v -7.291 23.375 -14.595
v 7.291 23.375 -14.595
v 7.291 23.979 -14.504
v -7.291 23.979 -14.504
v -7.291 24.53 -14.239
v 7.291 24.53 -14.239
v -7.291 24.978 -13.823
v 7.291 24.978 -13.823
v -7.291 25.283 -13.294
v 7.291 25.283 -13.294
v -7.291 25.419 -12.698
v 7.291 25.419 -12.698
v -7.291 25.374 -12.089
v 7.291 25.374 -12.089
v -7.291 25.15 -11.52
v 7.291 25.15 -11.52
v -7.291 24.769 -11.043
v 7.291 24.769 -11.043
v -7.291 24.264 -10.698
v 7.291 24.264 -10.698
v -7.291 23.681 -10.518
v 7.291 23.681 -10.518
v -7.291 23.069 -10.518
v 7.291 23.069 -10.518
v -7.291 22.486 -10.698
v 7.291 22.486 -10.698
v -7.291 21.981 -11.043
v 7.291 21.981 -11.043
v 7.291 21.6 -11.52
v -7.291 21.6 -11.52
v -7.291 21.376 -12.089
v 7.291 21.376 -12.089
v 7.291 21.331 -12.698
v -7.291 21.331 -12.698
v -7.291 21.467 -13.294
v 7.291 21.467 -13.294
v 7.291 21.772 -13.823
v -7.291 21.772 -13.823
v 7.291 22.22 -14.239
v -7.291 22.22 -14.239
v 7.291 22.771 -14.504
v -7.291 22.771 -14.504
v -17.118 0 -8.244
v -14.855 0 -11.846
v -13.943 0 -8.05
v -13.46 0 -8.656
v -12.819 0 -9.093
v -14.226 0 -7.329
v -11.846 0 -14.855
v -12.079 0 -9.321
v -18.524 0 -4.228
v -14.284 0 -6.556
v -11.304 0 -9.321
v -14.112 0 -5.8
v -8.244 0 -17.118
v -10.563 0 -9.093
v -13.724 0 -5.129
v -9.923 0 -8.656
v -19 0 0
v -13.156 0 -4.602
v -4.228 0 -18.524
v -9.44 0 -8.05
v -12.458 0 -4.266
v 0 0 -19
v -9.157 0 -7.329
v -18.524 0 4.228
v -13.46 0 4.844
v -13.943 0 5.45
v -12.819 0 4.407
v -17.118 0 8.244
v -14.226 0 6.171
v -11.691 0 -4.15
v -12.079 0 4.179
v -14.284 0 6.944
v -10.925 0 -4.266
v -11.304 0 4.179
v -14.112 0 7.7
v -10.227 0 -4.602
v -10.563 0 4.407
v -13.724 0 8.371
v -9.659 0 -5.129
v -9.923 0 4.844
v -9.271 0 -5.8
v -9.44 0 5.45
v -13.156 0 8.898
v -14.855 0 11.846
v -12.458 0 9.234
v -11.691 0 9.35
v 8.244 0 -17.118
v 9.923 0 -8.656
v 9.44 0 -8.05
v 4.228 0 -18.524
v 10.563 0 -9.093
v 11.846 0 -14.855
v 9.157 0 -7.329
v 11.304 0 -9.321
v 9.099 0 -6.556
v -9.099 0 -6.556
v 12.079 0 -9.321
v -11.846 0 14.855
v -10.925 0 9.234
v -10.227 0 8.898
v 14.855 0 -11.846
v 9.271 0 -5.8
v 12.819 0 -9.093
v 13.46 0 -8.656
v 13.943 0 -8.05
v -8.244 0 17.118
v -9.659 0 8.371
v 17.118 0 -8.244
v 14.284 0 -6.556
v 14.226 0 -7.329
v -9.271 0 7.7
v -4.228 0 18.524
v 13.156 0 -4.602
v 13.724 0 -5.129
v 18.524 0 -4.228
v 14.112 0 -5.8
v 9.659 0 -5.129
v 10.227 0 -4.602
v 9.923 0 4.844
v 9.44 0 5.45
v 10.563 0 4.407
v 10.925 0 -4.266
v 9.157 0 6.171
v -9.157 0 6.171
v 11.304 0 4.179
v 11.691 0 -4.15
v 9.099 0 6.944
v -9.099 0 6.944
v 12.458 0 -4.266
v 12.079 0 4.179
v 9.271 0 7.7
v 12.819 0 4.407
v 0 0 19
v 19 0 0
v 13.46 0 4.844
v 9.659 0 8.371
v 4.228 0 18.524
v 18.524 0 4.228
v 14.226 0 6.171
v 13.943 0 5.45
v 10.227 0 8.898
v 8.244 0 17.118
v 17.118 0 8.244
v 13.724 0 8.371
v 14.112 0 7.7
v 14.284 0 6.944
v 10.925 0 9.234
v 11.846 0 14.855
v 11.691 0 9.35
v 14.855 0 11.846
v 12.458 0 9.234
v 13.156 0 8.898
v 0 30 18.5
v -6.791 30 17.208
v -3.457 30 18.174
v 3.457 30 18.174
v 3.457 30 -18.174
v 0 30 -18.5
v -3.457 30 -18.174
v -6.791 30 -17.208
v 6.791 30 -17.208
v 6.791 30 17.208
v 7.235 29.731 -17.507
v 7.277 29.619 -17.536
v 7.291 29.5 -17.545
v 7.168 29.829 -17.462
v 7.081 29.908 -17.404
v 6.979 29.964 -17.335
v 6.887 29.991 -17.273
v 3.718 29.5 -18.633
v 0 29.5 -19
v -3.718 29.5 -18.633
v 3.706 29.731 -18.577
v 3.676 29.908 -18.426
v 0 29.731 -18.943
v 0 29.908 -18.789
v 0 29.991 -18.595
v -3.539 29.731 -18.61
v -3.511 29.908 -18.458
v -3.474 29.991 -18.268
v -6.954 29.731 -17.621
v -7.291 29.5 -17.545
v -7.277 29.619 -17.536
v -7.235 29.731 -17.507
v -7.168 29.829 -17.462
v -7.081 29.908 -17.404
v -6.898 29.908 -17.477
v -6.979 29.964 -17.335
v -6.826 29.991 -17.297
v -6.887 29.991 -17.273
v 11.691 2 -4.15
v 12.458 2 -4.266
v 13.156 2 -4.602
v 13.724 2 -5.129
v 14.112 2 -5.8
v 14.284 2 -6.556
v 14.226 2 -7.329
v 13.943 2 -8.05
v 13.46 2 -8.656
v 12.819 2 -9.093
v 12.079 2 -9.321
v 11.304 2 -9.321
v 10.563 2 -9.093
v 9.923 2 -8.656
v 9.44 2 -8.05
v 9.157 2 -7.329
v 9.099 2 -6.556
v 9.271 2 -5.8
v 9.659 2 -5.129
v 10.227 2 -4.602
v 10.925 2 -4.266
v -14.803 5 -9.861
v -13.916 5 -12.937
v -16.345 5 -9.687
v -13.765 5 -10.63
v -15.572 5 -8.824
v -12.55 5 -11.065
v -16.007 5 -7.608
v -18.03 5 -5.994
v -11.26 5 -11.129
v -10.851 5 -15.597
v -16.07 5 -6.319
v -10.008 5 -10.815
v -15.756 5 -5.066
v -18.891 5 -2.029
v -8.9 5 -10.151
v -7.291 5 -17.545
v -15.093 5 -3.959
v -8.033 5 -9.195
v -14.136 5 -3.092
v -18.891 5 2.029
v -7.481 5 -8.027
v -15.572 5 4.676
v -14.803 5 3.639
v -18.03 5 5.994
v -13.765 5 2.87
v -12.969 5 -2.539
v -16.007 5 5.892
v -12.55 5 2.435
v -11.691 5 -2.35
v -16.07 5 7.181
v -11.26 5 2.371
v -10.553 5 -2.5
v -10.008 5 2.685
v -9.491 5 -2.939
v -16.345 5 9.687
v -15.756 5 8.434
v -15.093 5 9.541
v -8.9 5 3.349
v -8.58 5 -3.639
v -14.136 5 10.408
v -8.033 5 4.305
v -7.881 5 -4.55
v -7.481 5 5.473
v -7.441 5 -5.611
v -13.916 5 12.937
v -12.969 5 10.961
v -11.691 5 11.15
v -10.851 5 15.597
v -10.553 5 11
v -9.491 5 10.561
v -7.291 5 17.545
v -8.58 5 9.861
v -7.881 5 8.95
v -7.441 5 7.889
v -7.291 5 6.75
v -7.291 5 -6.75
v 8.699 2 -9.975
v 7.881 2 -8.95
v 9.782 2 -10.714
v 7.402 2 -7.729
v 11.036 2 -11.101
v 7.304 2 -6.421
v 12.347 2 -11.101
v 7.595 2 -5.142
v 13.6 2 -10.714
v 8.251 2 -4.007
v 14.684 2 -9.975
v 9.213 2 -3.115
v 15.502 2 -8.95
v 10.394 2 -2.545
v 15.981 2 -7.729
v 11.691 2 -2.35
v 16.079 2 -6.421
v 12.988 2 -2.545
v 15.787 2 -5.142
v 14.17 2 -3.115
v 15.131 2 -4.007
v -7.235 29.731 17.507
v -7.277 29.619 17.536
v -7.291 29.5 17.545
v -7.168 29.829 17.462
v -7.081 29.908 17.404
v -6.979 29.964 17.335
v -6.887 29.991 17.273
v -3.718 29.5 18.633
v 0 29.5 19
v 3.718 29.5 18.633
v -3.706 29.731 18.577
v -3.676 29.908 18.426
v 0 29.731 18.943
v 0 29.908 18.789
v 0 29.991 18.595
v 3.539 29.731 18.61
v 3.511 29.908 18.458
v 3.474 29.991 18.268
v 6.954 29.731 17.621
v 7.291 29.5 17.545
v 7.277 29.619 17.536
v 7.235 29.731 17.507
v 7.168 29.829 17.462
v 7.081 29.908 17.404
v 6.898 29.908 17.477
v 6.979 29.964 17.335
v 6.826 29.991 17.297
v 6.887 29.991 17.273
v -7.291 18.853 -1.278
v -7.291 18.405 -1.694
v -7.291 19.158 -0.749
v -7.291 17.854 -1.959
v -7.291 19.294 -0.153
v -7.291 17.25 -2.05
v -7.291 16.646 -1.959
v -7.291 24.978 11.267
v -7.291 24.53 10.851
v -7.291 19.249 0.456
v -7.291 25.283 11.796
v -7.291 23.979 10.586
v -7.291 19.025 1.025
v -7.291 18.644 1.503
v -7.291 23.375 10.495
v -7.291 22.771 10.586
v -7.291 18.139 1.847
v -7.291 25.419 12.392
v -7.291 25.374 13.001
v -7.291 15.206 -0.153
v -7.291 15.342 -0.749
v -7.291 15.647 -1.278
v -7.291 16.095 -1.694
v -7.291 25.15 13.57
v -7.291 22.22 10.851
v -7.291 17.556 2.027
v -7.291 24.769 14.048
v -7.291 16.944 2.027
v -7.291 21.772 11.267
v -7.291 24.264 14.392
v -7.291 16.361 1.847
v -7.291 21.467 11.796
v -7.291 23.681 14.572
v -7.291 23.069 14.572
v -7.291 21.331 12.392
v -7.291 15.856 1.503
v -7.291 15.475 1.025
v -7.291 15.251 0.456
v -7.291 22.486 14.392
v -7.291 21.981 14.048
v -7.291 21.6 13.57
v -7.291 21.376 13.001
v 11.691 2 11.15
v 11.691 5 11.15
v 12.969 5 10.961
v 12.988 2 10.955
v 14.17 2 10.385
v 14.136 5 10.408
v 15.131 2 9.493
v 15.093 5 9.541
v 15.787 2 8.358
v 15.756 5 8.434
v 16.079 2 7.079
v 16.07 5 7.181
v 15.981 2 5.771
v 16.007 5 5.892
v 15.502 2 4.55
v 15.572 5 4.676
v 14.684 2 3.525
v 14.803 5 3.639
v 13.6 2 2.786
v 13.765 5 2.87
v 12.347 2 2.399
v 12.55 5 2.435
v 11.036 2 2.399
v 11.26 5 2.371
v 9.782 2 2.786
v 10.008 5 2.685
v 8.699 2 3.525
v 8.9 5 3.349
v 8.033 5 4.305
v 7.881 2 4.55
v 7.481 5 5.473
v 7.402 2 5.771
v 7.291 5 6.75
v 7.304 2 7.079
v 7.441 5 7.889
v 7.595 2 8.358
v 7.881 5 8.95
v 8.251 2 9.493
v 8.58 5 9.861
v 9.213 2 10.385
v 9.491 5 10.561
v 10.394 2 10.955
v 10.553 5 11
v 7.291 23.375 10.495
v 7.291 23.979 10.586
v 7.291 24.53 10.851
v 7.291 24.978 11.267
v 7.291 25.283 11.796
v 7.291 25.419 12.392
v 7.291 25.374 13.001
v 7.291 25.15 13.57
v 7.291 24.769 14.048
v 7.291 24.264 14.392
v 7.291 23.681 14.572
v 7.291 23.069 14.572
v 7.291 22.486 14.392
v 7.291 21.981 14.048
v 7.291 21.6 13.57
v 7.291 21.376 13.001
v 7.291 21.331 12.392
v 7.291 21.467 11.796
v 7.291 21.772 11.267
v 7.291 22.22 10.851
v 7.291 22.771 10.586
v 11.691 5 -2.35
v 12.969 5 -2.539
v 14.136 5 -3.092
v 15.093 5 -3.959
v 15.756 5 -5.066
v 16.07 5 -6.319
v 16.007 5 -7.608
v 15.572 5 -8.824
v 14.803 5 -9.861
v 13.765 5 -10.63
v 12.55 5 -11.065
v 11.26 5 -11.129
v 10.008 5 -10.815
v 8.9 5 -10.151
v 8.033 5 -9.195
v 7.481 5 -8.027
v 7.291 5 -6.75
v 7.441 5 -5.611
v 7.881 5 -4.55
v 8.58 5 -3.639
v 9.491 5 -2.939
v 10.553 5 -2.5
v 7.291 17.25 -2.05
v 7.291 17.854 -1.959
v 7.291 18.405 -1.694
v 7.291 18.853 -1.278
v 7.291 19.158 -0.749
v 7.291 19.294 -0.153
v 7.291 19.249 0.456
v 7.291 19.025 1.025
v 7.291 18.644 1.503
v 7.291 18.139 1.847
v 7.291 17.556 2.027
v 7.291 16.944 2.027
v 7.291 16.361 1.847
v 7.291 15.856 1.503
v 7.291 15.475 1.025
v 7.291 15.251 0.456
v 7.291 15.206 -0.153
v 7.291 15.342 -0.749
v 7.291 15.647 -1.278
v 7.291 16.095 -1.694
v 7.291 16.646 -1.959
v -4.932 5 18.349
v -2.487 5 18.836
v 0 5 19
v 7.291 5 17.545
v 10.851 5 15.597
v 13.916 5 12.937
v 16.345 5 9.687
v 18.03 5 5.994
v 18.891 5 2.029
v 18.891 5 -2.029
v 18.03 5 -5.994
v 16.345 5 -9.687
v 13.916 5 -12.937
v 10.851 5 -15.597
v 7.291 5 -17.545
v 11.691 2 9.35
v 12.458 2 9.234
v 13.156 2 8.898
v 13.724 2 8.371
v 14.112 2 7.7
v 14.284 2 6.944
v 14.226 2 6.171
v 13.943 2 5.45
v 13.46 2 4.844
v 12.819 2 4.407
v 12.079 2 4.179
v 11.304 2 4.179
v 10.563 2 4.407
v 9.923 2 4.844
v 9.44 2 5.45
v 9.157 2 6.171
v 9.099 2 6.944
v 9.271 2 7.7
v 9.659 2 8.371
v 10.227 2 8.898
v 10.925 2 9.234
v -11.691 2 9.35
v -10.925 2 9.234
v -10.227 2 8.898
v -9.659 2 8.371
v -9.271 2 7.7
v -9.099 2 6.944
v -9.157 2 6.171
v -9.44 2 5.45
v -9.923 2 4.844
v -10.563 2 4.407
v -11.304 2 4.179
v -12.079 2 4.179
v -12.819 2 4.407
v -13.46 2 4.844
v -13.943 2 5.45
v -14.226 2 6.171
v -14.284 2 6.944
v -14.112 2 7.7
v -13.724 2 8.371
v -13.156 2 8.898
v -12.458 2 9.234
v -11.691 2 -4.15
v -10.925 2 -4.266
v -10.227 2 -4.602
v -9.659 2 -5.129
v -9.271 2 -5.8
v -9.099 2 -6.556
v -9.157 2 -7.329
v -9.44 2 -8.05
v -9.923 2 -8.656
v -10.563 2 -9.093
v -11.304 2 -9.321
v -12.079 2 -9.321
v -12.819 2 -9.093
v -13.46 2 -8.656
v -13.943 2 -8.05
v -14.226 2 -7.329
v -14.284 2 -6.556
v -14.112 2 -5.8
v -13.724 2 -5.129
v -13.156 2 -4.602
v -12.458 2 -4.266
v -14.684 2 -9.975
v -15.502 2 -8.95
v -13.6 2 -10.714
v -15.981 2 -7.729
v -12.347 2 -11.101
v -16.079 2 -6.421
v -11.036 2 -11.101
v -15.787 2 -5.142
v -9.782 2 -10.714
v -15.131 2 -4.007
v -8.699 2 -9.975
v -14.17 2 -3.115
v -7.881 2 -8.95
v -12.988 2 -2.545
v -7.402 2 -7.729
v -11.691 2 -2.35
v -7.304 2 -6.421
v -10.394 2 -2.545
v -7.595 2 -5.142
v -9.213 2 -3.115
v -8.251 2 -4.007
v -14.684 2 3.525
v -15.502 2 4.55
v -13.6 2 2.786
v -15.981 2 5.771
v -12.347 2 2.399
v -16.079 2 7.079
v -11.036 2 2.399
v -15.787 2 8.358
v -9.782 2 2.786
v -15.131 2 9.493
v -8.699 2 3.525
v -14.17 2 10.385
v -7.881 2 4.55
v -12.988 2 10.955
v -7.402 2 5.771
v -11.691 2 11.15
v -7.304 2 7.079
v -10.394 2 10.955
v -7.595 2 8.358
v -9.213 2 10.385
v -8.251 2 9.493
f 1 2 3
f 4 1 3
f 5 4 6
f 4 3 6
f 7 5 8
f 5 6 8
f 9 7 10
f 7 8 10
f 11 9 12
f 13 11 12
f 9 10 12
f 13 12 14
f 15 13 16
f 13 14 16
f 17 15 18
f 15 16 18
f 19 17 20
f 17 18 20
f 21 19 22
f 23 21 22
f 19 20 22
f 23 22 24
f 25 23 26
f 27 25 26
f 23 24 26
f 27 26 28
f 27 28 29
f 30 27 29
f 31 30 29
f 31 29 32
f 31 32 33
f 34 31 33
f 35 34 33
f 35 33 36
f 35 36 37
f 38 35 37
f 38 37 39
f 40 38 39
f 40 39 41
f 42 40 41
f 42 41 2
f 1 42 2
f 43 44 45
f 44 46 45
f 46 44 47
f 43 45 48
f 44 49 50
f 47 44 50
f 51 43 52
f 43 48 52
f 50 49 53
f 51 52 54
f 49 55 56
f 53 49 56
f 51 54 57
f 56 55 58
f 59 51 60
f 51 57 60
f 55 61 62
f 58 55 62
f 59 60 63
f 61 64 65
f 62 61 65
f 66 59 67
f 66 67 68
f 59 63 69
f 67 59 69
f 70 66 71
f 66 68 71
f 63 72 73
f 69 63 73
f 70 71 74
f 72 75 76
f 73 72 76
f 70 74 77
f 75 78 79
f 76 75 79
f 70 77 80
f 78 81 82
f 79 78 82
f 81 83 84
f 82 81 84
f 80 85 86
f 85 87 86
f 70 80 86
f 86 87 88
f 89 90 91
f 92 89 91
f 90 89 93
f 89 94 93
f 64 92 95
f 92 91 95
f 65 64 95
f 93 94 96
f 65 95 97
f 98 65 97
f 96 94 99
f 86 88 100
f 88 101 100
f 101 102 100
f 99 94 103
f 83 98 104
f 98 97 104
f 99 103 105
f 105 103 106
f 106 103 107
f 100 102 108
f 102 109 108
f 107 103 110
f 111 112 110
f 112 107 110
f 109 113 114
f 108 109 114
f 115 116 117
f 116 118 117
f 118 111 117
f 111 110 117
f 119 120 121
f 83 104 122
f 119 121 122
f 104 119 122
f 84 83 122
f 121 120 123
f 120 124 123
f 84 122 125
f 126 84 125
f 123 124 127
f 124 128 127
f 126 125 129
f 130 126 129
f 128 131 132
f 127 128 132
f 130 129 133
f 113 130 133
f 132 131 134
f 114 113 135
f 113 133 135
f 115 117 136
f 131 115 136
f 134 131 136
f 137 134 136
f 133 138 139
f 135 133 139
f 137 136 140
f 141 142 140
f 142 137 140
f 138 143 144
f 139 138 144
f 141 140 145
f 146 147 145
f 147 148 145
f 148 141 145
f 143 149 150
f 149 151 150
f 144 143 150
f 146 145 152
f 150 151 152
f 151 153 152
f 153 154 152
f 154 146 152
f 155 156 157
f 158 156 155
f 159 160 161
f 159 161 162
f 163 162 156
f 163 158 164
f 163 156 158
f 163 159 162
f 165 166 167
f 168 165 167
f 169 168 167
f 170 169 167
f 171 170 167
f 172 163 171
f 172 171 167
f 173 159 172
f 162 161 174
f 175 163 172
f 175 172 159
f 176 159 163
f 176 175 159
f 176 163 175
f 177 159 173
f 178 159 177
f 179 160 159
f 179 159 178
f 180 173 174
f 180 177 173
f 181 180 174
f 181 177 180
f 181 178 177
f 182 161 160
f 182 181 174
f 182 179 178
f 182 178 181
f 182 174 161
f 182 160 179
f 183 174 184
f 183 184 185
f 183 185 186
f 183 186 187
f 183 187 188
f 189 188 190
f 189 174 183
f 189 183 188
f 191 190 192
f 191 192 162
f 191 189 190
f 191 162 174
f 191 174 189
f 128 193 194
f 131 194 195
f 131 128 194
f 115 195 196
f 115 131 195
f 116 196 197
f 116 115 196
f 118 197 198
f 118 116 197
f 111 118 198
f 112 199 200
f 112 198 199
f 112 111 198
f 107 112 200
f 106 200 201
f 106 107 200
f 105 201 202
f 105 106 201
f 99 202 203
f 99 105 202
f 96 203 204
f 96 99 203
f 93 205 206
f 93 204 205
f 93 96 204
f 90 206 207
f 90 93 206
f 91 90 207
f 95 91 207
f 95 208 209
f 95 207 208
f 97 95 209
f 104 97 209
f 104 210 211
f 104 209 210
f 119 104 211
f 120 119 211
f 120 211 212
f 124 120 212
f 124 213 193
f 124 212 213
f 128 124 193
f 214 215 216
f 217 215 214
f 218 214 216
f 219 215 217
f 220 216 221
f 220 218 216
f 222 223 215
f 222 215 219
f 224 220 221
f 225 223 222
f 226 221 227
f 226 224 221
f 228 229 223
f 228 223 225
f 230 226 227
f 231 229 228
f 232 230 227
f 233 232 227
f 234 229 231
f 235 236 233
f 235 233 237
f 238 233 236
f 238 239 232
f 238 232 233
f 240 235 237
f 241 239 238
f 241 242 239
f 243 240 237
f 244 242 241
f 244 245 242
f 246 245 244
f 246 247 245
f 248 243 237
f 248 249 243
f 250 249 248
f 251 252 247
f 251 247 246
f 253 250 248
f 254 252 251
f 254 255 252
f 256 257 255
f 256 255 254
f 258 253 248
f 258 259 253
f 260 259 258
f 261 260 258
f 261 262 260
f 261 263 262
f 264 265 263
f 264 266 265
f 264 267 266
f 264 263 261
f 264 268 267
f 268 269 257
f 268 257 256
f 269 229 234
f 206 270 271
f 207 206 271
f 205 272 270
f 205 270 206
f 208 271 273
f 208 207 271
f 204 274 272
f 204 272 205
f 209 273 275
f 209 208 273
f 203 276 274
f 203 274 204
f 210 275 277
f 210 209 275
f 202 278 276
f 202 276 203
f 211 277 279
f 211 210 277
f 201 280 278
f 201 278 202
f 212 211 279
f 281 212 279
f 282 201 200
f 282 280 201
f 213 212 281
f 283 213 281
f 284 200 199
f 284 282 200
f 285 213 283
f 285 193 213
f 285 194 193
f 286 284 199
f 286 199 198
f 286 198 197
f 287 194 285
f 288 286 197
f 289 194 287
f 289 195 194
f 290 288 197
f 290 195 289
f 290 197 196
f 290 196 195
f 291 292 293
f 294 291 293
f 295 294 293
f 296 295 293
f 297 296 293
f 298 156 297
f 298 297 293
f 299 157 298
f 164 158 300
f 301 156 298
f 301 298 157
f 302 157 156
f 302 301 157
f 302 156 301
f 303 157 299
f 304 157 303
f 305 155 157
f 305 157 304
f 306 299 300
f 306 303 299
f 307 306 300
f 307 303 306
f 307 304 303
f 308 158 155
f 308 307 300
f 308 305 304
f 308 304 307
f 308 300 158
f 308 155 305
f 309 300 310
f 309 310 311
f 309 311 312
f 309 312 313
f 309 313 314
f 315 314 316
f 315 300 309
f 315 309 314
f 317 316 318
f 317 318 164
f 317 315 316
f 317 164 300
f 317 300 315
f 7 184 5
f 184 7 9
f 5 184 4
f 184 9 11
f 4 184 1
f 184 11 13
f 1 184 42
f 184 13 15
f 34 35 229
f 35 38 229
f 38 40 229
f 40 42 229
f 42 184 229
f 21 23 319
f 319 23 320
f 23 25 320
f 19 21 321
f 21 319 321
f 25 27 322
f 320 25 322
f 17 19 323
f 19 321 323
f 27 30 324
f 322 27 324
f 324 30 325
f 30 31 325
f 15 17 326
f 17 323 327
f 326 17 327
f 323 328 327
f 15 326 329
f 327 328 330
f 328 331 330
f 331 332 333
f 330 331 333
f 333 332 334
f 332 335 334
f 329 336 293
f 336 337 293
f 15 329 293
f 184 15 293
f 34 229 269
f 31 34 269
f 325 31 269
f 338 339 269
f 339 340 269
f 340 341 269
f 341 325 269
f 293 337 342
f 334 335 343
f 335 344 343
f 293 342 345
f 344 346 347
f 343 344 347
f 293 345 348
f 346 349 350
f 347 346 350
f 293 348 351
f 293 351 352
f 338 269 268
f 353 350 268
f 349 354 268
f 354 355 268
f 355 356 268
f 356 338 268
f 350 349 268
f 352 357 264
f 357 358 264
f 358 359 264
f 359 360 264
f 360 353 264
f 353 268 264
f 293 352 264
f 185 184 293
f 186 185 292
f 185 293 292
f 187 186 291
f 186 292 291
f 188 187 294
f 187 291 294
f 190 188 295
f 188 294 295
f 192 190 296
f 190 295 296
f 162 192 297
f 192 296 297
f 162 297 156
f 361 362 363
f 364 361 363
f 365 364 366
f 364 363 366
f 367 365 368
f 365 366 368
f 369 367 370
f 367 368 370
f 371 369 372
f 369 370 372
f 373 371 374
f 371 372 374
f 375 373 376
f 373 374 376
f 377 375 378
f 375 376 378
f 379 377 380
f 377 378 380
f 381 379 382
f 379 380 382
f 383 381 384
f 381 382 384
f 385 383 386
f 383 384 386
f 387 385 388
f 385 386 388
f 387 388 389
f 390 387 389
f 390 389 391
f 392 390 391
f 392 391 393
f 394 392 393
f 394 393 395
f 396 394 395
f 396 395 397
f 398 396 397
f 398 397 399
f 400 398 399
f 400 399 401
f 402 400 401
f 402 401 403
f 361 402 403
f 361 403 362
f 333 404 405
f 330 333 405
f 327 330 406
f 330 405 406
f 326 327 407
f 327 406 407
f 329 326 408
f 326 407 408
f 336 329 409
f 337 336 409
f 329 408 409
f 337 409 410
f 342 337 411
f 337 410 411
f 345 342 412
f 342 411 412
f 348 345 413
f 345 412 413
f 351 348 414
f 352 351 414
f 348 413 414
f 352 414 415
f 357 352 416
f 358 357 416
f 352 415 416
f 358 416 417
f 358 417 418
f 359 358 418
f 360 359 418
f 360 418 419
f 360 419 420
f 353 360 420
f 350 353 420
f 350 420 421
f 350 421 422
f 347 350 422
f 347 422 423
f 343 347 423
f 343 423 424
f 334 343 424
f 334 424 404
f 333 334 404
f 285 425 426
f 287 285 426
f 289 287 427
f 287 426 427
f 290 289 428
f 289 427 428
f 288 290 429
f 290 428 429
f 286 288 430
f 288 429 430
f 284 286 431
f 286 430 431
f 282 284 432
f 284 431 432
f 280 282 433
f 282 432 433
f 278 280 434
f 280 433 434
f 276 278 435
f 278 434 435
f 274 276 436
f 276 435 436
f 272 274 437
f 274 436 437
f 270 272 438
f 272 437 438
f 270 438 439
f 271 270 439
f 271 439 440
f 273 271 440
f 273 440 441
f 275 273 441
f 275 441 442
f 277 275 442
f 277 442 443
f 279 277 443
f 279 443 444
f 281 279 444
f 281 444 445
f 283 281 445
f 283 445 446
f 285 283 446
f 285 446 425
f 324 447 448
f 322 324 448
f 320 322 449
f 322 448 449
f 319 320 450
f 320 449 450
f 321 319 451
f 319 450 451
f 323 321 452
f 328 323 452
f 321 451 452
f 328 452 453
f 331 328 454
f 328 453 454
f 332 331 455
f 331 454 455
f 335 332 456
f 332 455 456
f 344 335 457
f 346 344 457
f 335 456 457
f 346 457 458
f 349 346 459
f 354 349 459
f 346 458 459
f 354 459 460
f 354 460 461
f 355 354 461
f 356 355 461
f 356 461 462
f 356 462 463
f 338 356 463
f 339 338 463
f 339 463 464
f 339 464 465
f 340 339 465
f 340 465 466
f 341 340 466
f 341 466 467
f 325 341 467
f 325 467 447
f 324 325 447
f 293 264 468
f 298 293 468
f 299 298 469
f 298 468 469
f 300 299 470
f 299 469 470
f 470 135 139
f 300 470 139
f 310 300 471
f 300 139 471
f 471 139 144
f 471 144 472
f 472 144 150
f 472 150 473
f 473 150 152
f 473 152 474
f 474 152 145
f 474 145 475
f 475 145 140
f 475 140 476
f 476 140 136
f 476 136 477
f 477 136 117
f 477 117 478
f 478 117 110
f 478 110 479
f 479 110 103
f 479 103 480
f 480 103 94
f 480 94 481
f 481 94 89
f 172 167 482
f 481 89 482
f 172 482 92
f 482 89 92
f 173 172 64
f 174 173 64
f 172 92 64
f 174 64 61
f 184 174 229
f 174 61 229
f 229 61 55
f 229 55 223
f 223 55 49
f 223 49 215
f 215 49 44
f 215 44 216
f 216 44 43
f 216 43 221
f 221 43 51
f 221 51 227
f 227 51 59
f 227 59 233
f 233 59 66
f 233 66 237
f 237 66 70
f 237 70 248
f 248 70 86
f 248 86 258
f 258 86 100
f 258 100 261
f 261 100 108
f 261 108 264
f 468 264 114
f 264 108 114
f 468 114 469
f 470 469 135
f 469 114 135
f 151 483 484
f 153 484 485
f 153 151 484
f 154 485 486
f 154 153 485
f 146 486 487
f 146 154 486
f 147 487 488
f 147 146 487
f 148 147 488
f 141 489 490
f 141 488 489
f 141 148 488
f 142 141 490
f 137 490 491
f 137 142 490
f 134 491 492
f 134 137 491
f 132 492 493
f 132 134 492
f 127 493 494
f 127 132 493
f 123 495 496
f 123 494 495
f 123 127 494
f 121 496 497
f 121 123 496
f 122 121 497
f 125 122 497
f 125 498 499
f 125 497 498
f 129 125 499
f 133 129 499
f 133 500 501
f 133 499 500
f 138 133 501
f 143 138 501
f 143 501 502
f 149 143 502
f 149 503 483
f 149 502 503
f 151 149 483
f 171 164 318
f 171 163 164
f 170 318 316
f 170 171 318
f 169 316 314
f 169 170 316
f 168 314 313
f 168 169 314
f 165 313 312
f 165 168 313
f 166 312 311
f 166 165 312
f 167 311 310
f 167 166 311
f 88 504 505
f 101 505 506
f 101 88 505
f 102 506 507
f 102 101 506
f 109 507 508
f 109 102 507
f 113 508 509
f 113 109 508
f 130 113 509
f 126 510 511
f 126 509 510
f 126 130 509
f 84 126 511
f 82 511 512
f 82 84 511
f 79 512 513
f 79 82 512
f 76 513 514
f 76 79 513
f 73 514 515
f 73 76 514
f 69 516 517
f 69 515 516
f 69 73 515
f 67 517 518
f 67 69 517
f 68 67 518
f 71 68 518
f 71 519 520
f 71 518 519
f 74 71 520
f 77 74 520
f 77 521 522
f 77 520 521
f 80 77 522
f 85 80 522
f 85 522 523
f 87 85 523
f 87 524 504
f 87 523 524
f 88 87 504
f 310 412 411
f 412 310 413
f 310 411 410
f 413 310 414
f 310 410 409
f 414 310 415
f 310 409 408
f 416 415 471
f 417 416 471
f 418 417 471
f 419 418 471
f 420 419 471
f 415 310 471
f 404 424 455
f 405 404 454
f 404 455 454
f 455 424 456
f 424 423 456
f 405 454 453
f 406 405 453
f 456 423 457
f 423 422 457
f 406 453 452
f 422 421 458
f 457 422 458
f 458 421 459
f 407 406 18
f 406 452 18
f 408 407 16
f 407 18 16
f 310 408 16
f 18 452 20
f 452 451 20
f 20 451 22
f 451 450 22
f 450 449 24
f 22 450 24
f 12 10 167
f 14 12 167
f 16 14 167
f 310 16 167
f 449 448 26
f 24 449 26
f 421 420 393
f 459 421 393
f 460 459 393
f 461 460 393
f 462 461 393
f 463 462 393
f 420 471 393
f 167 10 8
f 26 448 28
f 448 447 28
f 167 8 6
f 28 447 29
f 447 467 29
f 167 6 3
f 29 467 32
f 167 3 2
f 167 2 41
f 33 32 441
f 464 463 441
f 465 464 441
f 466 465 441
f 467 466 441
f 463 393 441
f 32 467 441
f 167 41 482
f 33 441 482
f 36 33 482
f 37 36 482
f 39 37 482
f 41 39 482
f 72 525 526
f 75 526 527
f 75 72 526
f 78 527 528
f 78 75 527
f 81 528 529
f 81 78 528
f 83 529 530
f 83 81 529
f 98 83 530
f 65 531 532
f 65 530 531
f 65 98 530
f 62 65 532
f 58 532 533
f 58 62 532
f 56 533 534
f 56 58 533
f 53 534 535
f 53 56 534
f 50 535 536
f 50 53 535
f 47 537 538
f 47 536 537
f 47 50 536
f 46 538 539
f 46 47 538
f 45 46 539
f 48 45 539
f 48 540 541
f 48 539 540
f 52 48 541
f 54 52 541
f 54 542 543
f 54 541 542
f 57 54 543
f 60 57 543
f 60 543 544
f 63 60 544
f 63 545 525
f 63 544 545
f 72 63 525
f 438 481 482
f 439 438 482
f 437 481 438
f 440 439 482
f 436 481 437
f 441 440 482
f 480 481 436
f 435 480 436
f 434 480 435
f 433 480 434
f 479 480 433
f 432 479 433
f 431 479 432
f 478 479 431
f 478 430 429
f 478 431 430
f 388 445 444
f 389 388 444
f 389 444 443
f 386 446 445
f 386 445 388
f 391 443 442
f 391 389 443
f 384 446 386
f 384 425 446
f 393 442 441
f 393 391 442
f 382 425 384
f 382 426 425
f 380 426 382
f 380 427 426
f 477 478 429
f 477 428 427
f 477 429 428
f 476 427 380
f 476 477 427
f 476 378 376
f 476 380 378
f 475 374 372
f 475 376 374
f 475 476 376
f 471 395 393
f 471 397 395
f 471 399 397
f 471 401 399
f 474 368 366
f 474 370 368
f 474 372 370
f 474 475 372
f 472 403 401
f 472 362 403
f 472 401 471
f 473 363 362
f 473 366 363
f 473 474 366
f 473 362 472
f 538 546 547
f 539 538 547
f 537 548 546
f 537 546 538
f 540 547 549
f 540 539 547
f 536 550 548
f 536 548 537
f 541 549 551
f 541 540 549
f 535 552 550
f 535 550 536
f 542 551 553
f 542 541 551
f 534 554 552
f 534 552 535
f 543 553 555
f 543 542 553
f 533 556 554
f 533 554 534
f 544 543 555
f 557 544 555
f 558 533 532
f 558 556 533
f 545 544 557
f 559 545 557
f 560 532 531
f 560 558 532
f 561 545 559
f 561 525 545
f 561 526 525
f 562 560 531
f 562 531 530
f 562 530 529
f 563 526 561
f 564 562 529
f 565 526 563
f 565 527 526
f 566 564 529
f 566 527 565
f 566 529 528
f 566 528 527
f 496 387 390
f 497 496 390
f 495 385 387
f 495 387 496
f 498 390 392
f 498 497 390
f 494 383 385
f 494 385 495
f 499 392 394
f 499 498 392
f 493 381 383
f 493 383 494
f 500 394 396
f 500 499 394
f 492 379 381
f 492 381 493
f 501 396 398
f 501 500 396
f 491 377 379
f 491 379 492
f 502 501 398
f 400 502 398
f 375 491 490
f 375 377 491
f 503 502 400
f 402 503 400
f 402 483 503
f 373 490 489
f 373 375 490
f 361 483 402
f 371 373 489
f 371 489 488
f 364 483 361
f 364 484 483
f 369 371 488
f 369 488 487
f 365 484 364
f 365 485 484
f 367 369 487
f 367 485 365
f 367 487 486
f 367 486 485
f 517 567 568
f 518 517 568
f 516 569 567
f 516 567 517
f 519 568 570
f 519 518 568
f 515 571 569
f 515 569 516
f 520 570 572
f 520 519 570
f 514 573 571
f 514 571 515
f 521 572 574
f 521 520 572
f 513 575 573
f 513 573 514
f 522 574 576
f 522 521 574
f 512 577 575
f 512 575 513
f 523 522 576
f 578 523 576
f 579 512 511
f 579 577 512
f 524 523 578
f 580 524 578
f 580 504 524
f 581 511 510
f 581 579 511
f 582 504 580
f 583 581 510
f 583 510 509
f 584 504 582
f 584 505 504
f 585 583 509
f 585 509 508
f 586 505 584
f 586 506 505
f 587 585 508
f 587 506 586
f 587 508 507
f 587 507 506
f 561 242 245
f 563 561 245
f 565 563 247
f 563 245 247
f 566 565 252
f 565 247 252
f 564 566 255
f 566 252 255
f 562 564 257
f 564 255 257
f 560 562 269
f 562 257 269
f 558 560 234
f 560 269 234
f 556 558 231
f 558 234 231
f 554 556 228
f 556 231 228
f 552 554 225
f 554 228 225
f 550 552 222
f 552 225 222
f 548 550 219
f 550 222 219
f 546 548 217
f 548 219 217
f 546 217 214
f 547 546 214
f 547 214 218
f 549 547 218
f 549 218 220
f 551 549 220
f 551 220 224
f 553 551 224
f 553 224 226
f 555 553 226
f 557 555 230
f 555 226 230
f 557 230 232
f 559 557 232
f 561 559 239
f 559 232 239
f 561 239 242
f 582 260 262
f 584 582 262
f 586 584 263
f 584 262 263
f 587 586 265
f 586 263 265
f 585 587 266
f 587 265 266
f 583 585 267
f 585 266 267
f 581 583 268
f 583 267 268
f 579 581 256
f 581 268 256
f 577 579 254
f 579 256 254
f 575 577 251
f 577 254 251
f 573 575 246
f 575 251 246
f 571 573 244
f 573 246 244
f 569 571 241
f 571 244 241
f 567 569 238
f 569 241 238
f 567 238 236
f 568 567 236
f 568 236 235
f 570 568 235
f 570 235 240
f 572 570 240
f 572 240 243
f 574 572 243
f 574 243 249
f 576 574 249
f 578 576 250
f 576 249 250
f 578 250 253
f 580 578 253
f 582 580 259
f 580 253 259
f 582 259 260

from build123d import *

# Parameters (mm, degrees)
SKETCH1_R           = 19
SKETCH1_R_2         = 2.6
BOSS_EXTRUDE1_DEPTH = 5
SKETCH2_R           = 4.4
CUT_EXTRUDE1_DEPTH  = 3
BOSS_EXTRUDE2_DEPTH = 25
FILLET1_R           = 0.5
SKETCH4_R           = 2.05
CUT_EXTRUDE2_DEPTH  = 45.184100423


with BuildPart() as part:
    # Sketch1 → Boss-Extrude1 (new body)
    with BuildSketch(Plane(origin=(0, 0, 0), x_dir=(1, 0, 0), z_dir=(0, 1, 0))):
        with Locations(Location((0, 0, 0), (0, 0, 270))):
            Circle(SKETCH1_R)
        with Locations(Location((11.691342951, 6.75, 0), (0, 0, 270))):
            Circle(SKETCH1_R_2, mode=Mode.SUBTRACT)
        with Locations(Location((11.691342951, -6.75, 0), (0, 0, 270))):
            Circle(SKETCH1_R_2, mode=Mode.SUBTRACT)
        with Locations(Location((-11.691342951, -6.75, 0), (0, 0, 270))):
            Circle(SKETCH1_R_2, mode=Mode.SUBTRACT)
        with Locations(Location((-11.691342951, 6.75, 0), (0, 0, 270))):
            Circle(SKETCH1_R_2, mode=Mode.SUBTRACT)
    extrude(amount=BOSS_EXTRUDE1_DEPTH)

    # Sketch2 → Cut-Extrude1 (cut)
    with BuildSketch(Plane(origin=(0, 5, 0), x_dir=(1, 0, 0), z_dir=(0, 1, 0))):
        with Locations(Location((-11.691342951, 6.75, 0), (0, 0, 270))):
            Circle(SKETCH2_R)
        with Locations(Location((11.691342951, 6.75, 0), (0, 0, 270))):
            Circle(SKETCH2_R)
        with Locations(Location((11.691342951, -6.75, 0), (0, 0, 270))):
            Circle(SKETCH2_R)
        with Locations(Location((-11.691342951, -6.75, 0), (0, 0, 270))):
            Circle(SKETCH2_R)
    extrude(amount=-CUT_EXTRUDE1_DEPTH, mode=Mode.SUBTRACT)

    # Sketch3 → Boss-Extrude2 (add)
    with BuildSketch(Plane(origin=(0, 5, 0), x_dir=(1, 0, 0), z_dir=(0, 1, 0))):
        with BuildLine():
            Line((-7.291342951, 17.54526483), (-7.291342951, -17.54526483))
            ThreePointArc((-7.291342951, -17.54526483), (0, -19), (7.291342951, -17.54526483))
            Line((7.291342951, -17.54526483), (7.291342951, 17.54526483))
            ThreePointArc((7.291342951, 17.54526483), (0, 19), (-7.291342951, 17.54526483))
        make_face()
    extrude(amount=BOSS_EXTRUDE2_DEPTH)

    # Fillet1
    fillet1_edges = [part.edges().sort_by_distance(p)[0] for p in [
        (0, 30, -19),
        (-7.291342951, 30, 0),
        (0, 30, 19),
        (7.291342951, 30, 0),
    ]]
    fillet(fillet1_edges, radius=FILLET1_R)

    # Sketch4 → Cut-Extrude2 (cut, through all)
    with BuildSketch(Plane(origin=(7.291342951, 0, 0), x_dir=(0, 0, -1), z_dir=(1, 0, 0))):
        with Locations((-12.54526483, 23.375)):
            Circle(SKETCH4_R)
        with Locations((12.54526483, 23.375)):
            Circle(SKETCH4_R)
        with Locations((0, 17.25)):
            Circle(SKETCH4_R)
    extrude(amount=-CUT_EXTRUDE2_DEPTH, mode=Mode.SUBTRACT)


solid = part.part
